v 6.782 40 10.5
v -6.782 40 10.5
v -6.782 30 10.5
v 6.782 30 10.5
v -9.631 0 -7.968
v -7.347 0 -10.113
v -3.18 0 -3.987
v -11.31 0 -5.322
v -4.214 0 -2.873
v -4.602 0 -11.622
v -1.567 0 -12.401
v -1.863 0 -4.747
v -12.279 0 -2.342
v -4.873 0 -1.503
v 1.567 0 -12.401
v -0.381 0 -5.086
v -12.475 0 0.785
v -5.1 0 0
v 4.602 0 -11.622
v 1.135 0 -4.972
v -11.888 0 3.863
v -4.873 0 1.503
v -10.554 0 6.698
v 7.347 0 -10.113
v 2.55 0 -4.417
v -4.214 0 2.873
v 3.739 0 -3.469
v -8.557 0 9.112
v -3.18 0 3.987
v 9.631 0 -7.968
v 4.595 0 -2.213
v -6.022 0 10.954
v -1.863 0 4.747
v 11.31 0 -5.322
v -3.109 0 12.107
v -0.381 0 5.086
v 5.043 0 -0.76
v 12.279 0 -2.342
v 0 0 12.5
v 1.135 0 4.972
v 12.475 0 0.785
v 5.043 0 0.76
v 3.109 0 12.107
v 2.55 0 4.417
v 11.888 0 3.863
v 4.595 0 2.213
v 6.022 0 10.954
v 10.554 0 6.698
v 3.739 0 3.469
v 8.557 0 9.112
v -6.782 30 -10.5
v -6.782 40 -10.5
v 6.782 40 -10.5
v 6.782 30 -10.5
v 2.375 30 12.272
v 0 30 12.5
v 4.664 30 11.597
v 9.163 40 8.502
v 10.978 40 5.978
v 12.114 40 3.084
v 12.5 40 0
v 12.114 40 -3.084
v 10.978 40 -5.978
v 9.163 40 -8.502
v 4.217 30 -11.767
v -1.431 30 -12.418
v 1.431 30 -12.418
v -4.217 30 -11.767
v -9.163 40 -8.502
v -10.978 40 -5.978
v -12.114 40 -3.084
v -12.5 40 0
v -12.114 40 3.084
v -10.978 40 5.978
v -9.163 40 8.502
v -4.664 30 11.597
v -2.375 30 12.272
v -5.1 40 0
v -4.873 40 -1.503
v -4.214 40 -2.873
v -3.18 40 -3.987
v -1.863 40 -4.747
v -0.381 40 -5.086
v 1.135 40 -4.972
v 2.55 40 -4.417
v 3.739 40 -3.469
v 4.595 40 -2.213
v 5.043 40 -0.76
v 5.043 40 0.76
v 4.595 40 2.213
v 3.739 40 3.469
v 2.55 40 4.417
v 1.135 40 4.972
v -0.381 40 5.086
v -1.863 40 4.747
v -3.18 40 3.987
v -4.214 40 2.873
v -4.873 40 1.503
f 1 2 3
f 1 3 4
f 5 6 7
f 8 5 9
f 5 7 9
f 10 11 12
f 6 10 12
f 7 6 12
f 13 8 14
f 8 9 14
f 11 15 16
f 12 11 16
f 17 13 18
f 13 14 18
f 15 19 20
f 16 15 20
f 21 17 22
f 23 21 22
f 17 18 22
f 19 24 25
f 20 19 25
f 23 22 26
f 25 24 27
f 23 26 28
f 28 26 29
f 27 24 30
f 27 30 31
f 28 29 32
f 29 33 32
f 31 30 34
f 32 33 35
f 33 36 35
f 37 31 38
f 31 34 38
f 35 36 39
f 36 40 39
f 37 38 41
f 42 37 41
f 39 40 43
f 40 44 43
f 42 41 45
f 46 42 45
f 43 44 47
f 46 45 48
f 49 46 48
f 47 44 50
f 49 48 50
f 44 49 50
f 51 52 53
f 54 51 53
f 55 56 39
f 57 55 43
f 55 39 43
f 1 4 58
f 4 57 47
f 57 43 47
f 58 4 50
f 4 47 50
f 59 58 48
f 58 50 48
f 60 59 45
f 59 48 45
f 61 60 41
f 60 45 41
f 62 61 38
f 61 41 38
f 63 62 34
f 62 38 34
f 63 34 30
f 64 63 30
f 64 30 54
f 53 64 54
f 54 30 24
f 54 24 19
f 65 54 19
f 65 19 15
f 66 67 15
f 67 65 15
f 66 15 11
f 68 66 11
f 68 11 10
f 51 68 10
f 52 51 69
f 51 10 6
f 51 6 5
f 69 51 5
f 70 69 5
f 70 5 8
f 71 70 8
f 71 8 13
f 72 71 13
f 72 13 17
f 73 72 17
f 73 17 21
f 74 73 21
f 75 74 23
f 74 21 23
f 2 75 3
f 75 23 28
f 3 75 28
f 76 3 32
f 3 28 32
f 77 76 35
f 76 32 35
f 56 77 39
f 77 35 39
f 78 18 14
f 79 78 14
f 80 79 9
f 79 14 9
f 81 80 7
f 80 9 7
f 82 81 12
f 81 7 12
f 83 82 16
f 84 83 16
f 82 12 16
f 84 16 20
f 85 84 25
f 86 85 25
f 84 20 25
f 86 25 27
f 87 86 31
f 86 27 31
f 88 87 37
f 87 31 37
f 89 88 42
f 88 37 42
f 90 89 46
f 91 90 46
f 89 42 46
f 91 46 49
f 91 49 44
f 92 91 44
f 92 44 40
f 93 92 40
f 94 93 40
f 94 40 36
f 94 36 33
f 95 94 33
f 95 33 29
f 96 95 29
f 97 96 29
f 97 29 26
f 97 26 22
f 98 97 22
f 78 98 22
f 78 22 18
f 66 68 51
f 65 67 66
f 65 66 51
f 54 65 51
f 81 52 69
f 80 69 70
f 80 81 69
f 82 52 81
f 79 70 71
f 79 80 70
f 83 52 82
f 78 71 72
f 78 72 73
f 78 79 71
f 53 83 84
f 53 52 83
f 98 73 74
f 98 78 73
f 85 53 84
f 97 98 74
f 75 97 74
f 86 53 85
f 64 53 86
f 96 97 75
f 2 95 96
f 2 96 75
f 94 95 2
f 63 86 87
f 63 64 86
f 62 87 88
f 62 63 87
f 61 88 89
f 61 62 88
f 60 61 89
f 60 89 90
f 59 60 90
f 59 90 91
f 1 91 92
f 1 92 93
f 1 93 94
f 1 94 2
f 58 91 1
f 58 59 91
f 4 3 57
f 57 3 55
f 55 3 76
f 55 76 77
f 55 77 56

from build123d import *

# Parameters (mm, degrees)
SKETCH_1_R          = 12.5
EXTRUDE_1_DEPTH     = 40
SKETCH_2_W          = 36
SKETCH_2_H          = 27
SKETCH_2_W_2        = 30
SKETCH_2_H_2        = 21
CUT_EXTRUDE_1_DEPTH = 10
HOLE_WIZARD_M12_1_D = 10.2


with BuildPart() as part:
    # 草图1 → 凸台-拉伸1 (new body)
    with BuildSketch(Plane(origin=(0, 0, 0), x_dir=(1, 0, 0), z_dir=(0, 1, 0))):
        with Locations(Location((0, 0, 0), (0, 0, 270))):
            Circle(SKETCH_1_R)
    extrude(amount=EXTRUDE_1_DEPTH)

    # 草图2 → 切除-拉伸1 (cut)
    with BuildSketch(Plane(origin=(0, 40, 0), x_dir=(1, 0, 0), z_dir=(0, 1, 0))):
        Rectangle(SKETCH_2_W, SKETCH_2_H)
        Rectangle(SKETCH_2_W_2, SKETCH_2_H_2, mode=Mode.SUBTRACT)
    extrude(amount=-CUT_EXTRUDE_1_DEPTH, mode=Mode.SUBTRACT)

    # M12 螺纹孔1 (through all)
    with Locations(Plane(origin=(0, 40, 0), x_dir=(1, 0, 0), z_dir=(0, 1, 0))):
        with Locations((0, 0)):
            Hole(HOLE_WIZARD_M12_1_D / 2)


solid = part.part
